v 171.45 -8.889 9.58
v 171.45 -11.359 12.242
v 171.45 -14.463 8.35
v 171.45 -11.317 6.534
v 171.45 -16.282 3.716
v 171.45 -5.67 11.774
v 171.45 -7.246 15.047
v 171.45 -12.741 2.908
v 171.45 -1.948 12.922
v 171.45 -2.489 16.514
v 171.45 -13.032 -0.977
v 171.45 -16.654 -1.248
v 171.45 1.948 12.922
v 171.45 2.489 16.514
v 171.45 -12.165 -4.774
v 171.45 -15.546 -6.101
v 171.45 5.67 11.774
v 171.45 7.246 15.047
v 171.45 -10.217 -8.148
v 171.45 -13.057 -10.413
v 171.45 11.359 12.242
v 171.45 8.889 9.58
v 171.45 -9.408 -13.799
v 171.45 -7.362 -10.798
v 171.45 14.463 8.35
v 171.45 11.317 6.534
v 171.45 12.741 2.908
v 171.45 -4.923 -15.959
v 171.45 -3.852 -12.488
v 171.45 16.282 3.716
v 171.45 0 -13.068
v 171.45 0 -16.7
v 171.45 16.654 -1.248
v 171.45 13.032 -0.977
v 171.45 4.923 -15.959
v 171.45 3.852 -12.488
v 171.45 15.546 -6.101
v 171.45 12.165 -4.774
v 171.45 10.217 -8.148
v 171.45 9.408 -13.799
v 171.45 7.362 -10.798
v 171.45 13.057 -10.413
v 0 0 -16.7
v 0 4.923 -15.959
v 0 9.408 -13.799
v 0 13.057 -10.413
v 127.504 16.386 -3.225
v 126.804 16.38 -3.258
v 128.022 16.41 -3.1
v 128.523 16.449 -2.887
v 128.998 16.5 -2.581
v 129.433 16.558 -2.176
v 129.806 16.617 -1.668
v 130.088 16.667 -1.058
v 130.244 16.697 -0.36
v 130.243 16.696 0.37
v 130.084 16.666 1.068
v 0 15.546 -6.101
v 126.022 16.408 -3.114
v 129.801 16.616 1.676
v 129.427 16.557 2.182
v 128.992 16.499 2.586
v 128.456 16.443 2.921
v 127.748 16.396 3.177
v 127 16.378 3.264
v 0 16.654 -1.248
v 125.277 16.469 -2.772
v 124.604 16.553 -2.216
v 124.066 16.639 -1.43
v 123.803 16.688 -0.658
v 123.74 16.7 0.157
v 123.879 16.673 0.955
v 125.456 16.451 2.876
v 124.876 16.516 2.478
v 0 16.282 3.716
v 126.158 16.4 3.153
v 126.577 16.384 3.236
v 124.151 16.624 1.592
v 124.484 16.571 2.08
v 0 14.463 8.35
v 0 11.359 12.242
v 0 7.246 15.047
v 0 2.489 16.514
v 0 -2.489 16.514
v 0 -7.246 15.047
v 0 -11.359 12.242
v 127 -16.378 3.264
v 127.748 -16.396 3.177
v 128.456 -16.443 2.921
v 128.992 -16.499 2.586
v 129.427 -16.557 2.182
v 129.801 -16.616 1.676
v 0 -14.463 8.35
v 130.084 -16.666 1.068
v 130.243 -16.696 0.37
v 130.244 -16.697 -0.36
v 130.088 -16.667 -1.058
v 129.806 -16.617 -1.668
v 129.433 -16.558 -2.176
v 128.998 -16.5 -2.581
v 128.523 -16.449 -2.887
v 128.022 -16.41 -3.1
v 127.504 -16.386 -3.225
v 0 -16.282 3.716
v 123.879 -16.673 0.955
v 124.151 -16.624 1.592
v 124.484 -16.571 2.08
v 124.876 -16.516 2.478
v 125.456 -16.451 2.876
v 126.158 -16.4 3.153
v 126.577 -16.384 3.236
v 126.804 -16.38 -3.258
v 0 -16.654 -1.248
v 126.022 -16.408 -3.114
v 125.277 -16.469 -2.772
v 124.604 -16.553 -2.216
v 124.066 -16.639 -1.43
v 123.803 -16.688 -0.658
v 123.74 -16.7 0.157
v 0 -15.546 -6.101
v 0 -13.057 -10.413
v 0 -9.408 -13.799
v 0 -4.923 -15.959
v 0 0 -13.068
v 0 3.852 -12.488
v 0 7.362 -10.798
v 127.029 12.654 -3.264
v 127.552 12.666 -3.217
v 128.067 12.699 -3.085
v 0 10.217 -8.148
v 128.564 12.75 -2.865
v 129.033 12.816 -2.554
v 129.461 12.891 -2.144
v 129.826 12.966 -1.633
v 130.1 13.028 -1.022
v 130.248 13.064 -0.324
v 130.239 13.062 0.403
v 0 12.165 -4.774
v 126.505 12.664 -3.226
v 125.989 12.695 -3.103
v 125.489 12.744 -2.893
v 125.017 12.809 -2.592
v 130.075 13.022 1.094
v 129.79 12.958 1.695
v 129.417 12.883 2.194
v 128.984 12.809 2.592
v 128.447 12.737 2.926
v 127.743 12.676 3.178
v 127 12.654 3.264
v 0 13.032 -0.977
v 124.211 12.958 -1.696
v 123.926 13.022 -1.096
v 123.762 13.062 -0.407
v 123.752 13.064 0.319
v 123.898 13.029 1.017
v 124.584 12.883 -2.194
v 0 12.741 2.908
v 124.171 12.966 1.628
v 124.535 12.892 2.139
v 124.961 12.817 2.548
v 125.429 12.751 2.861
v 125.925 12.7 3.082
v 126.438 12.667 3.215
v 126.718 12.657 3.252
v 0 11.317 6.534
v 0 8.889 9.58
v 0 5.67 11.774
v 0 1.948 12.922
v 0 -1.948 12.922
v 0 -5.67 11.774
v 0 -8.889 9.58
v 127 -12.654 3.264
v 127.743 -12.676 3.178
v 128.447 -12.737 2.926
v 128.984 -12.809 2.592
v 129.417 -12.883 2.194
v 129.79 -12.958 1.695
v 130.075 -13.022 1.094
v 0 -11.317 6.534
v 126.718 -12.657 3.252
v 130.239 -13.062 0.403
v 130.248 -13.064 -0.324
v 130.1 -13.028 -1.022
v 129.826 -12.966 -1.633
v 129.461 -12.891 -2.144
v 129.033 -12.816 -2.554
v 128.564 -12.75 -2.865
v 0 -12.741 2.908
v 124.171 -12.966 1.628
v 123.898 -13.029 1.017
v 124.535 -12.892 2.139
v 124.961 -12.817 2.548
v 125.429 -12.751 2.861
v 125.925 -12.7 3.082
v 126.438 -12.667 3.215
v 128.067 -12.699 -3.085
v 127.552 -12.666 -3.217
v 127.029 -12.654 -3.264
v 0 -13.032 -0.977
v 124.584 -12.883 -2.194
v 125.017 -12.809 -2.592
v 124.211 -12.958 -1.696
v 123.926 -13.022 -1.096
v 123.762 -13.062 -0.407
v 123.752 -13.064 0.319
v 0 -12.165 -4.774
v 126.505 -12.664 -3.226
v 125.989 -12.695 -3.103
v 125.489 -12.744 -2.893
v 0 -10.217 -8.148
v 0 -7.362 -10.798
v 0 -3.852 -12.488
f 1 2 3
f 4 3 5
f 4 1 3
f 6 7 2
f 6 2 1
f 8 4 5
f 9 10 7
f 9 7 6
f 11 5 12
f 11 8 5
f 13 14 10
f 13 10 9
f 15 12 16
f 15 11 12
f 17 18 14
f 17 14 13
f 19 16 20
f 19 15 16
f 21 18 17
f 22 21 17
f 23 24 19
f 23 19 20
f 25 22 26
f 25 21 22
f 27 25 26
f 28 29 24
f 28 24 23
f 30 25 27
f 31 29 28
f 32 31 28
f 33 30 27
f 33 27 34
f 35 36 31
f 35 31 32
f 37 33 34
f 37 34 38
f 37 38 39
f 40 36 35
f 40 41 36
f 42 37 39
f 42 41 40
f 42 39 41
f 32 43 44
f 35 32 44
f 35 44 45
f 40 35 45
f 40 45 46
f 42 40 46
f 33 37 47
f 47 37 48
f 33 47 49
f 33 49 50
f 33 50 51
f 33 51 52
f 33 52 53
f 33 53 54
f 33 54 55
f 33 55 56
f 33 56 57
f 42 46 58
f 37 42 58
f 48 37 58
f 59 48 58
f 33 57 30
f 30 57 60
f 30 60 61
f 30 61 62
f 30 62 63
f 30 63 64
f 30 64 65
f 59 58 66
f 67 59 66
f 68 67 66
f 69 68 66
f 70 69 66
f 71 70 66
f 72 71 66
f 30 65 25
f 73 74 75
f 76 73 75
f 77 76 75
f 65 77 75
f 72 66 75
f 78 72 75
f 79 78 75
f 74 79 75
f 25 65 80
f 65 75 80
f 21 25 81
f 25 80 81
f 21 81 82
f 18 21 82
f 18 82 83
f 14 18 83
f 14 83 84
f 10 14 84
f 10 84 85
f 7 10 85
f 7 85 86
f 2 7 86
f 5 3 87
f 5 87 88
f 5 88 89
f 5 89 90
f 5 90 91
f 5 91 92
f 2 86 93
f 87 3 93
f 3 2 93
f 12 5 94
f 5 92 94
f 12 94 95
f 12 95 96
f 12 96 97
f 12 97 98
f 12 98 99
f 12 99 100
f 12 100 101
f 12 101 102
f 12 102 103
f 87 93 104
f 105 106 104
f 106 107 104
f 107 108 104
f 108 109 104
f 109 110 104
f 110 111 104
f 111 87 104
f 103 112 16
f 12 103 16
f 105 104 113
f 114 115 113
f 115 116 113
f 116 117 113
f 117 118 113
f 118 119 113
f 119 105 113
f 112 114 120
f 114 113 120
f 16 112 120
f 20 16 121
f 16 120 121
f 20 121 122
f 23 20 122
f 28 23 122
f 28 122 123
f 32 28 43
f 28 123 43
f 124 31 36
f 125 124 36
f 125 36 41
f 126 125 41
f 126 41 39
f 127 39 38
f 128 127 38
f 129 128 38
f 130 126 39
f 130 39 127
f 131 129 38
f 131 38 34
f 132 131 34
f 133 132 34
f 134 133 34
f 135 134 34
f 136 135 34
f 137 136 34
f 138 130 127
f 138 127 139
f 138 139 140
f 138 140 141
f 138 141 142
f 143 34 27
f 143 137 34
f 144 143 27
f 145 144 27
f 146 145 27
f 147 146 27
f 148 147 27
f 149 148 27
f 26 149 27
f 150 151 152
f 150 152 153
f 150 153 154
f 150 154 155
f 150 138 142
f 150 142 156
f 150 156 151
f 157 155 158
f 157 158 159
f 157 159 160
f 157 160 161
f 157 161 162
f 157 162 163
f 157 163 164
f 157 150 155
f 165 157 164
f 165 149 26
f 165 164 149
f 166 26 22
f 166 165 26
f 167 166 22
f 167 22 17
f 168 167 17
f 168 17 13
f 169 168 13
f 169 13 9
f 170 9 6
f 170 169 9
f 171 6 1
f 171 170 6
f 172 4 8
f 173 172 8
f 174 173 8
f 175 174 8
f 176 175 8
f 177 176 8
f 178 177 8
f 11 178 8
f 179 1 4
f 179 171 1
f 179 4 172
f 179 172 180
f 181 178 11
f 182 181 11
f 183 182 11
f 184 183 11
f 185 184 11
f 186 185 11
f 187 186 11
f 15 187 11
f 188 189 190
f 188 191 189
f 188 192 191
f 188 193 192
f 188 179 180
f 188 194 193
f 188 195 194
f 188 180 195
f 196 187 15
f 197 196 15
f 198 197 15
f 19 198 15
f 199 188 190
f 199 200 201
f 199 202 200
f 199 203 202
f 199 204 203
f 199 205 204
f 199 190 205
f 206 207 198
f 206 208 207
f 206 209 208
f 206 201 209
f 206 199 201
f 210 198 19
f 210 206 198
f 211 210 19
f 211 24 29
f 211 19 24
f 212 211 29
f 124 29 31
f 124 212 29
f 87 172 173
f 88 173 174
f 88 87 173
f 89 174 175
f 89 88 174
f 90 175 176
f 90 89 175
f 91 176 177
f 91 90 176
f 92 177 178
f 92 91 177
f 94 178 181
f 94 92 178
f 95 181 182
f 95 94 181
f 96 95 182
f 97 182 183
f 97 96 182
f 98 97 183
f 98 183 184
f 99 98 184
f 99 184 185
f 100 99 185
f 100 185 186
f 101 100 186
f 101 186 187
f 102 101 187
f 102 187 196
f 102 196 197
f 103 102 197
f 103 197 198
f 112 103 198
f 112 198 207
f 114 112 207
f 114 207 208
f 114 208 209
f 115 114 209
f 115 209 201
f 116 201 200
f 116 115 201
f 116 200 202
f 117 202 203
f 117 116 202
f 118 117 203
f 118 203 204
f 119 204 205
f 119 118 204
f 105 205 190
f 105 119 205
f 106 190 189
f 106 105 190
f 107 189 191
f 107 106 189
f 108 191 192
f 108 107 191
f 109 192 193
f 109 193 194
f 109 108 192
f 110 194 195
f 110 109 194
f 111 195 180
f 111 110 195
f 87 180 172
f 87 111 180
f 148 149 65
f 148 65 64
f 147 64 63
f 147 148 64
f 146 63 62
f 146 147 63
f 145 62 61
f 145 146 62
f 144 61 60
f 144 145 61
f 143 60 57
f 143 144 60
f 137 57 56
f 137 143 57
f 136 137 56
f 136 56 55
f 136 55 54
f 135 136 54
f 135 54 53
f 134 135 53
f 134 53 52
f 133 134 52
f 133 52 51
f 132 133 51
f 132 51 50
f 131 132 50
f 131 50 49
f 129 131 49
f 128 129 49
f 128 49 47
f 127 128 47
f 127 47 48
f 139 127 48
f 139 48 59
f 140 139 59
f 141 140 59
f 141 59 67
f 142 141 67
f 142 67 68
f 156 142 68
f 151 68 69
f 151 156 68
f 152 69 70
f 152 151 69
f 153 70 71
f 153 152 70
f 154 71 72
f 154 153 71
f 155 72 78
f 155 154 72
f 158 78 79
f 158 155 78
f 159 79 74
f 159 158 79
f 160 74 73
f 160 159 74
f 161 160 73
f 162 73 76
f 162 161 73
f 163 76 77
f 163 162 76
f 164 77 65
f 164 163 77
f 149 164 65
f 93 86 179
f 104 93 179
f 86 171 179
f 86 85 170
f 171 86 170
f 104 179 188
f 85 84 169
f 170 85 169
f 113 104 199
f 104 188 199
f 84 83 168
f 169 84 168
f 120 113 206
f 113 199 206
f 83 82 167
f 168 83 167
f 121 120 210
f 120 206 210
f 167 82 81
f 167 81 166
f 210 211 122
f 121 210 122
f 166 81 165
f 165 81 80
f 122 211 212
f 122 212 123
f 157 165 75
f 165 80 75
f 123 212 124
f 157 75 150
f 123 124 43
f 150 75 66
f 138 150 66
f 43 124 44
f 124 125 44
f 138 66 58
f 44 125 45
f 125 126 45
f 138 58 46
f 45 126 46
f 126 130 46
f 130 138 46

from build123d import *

# Parameters (mm, degrees)
SKETCH1_R               = 16.7005
SKETCH1_R_2             = 13.0683
BOSS_EXTRUDE1_DEPTH     = 254
CUT_EXTRUDE2_DEPTH      = 256.095694594
CUT_EXTRUDE2_DEPTH_BACK = 256.095694594
SKETCH3_R               = 3.2639
CUT_EXTRUDE4_START      = -82.55
SKETCH4_R               = 16.7005
CUT_EXTRUDE4_DEPTH      = 82.55


with BuildPart() as part:
    # Sketch1 → Boss-Extrude1 (new body)
    with BuildSketch(Plane(origin=(0, 0, 0), x_dir=(0, 0, -1), z_dir=(1, 0, 0))):
        Circle(SKETCH1_R)
        Circle(SKETCH1_R_2, mode=Mode.SUBTRACT)
    extrude(amount=BOSS_EXTRUDE1_DEPTH)

    # Sketch3 → Cut-Extrude2 (cut, two sides: drawn at the far end of the back side and taken through both)
    with BuildSketch(Plane(origin=(0, 0, 0), x_dir=(1, 0, 0), z_dir=(0, 1, 0)).offset(-CUT_EXTRUDE2_DEPTH_BACK)):
        with Locations(Location((127, 0, 0), (0, 0, 270))):
            Circle(SKETCH3_R)
    extrude(amount=CUT_EXTRUDE2_DEPTH + CUT_EXTRUDE2_DEPTH_BACK, mode=Mode.SUBTRACT)

    # Sketch4 → Cut-Extrude4 (cut)
    with BuildSketch(Plane(origin=(254, 0, 0), x_dir=(0, 0, -1), z_dir=(1, 0, 0)).offset(CUT_EXTRUDE4_START)):
        Circle(SKETCH4_R)
    extrude(amount=CUT_EXTRUDE4_DEPTH, mode=Mode.SUBTRACT)


solid = part.part
